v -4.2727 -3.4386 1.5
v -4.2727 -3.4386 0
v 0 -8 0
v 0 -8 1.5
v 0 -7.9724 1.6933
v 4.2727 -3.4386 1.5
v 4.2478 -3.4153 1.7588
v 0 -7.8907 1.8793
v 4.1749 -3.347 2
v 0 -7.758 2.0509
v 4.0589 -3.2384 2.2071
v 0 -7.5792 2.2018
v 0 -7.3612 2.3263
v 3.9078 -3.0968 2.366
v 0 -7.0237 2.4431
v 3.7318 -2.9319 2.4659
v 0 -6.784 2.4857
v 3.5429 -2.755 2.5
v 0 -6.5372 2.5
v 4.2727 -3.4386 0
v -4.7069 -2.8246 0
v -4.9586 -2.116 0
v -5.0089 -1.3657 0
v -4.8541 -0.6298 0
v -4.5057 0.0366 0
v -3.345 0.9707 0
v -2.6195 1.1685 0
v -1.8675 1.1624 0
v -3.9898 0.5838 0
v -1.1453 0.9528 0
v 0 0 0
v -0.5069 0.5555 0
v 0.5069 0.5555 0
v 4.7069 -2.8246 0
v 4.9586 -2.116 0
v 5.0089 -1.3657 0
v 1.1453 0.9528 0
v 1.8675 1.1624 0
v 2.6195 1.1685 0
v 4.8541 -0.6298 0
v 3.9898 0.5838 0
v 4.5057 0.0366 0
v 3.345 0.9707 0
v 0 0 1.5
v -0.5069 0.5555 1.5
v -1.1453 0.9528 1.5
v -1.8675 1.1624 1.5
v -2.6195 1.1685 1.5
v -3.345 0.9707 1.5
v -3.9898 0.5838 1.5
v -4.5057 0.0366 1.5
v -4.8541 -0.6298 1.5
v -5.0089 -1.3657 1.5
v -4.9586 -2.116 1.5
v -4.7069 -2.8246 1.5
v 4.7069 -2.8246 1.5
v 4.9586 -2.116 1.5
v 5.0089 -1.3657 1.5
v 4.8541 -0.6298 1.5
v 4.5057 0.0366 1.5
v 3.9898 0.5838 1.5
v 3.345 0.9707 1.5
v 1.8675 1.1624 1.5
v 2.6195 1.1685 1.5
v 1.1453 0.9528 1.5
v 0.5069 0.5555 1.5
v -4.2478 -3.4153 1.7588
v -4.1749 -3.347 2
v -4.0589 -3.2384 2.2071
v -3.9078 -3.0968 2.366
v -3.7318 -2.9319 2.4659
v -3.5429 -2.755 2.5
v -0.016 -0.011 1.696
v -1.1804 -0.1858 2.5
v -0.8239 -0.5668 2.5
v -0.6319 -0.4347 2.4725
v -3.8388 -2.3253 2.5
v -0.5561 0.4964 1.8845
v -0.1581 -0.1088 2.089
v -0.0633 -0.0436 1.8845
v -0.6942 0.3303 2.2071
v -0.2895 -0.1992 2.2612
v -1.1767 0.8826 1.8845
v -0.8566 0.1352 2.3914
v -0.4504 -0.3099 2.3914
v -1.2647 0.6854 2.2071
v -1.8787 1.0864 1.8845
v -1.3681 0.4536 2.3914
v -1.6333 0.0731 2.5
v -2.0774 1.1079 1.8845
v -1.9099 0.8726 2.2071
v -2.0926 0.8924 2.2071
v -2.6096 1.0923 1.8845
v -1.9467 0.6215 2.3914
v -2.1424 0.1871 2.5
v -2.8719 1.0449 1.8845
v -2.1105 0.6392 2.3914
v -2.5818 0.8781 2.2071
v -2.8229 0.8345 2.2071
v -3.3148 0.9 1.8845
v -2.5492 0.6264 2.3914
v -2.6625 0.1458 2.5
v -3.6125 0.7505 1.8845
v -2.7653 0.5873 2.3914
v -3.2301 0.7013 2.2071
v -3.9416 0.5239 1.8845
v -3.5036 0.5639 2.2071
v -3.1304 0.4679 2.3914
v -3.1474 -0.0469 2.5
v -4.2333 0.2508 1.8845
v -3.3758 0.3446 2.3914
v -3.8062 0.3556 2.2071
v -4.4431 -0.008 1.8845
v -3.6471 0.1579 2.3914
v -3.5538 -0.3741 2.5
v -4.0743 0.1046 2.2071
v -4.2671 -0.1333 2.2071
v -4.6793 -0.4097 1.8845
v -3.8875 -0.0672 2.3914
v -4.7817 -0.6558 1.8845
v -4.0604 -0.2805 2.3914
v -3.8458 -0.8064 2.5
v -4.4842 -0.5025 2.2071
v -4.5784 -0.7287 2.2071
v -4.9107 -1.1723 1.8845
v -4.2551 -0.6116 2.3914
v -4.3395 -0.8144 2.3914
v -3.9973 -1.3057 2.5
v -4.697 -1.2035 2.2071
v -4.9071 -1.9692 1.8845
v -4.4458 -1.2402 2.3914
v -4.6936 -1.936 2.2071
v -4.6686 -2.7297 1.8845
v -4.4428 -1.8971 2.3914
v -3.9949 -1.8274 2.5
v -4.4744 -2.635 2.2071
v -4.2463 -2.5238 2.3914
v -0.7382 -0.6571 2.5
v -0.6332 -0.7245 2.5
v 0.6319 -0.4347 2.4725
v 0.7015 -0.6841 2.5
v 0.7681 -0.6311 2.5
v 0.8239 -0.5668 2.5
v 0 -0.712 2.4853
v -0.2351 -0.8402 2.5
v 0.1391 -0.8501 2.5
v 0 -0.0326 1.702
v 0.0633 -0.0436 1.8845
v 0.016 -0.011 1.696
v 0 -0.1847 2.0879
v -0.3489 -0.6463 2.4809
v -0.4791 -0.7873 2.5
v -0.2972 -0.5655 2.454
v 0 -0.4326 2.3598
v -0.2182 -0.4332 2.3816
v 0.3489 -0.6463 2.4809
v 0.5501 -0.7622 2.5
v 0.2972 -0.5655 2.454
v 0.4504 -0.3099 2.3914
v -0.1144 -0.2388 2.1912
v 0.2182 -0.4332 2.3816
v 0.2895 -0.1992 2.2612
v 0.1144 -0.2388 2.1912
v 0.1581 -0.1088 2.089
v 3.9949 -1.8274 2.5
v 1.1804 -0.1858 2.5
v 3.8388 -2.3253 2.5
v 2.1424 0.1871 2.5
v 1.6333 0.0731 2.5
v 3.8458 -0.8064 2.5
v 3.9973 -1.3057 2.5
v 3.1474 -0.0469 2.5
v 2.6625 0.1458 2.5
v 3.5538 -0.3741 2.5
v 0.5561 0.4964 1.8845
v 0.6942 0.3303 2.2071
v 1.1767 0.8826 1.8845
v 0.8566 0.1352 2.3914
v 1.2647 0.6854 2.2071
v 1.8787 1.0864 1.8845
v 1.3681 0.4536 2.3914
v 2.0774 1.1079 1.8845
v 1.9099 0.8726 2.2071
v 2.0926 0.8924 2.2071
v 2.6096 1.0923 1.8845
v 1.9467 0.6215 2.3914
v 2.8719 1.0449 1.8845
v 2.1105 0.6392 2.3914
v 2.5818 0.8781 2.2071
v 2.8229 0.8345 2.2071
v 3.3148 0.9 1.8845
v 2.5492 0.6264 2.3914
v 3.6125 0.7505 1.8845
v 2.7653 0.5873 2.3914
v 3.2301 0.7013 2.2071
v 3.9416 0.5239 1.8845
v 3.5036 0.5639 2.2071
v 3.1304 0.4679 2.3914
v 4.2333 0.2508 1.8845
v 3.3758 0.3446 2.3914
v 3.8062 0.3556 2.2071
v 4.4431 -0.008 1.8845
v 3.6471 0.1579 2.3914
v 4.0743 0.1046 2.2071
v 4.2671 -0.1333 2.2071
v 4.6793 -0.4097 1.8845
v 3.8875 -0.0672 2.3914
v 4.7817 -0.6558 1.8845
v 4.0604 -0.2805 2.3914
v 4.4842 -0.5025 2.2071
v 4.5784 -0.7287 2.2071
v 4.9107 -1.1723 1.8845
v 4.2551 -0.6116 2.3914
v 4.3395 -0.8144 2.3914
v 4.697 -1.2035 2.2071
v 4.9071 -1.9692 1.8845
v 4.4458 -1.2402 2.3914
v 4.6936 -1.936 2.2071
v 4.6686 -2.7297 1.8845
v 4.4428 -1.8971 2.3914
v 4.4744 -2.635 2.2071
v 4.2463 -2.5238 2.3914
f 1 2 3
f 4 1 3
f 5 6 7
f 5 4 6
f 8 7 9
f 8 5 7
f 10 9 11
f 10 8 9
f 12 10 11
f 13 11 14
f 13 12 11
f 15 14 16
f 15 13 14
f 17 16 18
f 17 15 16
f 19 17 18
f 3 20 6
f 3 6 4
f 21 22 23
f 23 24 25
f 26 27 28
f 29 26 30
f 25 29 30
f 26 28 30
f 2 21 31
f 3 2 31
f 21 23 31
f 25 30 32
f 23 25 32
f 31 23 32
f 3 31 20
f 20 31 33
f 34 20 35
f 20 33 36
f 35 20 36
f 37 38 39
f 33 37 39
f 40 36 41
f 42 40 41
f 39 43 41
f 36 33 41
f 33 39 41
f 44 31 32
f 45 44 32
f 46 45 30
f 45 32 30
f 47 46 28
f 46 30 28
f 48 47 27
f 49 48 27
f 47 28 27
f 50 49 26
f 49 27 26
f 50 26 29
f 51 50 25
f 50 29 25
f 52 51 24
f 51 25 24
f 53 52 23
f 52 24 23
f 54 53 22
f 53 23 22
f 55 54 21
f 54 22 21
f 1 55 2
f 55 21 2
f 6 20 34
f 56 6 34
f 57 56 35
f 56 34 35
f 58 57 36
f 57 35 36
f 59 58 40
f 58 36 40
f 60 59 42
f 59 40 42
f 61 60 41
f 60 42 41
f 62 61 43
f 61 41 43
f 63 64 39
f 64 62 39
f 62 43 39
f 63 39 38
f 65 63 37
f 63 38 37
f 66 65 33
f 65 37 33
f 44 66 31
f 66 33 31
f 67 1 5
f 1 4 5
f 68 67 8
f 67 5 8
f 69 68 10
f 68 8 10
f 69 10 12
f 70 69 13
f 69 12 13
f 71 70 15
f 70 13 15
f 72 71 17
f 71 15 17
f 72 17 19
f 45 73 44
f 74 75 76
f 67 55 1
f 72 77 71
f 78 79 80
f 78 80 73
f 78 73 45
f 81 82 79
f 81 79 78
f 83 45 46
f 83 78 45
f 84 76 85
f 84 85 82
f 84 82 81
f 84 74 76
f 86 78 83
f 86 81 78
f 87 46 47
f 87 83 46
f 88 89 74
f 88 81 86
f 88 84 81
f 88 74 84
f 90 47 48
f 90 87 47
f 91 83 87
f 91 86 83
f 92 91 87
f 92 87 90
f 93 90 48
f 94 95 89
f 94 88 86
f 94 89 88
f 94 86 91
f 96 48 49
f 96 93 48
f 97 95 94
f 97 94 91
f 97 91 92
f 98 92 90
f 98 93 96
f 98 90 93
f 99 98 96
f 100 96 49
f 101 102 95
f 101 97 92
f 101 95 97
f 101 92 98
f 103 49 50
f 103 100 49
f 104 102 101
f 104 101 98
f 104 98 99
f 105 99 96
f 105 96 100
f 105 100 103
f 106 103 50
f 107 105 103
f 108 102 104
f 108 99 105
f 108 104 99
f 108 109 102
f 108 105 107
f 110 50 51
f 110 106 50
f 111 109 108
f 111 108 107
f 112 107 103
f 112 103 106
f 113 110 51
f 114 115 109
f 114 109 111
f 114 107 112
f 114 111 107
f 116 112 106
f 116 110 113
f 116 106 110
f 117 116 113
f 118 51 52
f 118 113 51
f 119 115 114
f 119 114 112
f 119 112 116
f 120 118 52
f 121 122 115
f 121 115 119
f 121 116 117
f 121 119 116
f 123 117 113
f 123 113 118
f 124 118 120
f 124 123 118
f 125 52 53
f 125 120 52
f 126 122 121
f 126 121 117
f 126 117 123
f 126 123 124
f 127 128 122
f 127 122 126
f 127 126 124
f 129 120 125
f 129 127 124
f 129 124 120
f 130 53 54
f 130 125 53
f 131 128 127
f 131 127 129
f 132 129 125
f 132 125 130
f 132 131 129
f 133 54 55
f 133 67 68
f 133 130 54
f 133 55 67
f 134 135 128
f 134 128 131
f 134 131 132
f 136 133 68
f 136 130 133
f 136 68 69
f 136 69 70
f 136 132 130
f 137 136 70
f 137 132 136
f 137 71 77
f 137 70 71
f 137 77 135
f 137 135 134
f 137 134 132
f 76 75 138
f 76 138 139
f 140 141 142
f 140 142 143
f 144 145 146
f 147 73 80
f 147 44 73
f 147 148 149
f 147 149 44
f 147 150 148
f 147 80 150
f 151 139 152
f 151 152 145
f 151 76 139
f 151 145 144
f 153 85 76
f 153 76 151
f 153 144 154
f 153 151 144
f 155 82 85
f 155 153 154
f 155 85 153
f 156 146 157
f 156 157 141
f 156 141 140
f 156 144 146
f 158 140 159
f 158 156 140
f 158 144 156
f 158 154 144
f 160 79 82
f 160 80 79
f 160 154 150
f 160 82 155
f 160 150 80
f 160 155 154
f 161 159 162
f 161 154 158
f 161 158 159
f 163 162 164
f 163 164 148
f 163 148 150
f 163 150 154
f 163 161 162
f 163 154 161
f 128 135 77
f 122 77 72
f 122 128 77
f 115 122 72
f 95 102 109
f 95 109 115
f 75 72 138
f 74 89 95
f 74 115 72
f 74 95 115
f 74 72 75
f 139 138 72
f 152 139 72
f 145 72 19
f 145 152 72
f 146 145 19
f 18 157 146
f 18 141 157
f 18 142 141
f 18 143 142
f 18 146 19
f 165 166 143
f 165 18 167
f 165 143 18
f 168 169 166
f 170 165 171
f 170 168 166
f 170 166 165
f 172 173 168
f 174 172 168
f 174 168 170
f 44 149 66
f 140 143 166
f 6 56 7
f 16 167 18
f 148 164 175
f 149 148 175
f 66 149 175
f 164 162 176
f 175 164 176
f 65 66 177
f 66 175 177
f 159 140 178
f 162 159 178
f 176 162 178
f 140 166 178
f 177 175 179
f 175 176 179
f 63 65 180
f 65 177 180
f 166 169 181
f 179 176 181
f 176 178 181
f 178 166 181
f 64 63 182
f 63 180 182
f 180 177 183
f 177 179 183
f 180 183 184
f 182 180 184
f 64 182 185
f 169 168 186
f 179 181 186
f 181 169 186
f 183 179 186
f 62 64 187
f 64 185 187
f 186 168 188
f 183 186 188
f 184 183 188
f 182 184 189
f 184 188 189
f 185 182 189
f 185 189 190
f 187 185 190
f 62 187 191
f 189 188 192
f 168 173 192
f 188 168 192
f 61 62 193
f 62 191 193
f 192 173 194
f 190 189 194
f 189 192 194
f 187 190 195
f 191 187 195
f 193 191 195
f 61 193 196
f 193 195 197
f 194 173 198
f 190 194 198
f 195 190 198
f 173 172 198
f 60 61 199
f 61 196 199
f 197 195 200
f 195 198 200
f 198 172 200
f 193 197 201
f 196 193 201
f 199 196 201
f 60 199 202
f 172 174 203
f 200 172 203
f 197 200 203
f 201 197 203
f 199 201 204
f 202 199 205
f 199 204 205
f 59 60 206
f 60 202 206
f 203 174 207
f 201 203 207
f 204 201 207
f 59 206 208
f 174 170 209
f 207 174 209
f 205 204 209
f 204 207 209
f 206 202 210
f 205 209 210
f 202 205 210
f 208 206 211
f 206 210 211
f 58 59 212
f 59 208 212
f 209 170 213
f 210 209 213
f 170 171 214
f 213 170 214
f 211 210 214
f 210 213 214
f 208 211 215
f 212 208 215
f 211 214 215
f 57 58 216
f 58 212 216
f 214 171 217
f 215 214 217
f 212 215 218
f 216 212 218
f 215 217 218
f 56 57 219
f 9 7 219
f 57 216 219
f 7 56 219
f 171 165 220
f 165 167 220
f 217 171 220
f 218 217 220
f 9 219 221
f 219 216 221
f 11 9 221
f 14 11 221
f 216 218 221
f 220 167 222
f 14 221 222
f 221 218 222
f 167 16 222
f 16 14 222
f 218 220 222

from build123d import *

# Parameters (mm, degrees)
PAD_DEPTH = 2.5
FILLET_R  = 1


with BuildPart() as part:
    # Sketch → Pad (new body)
    with BuildSketch(Plane.XY):
        with BuildLine():
            ThreePointArc((0, 0), (-3.989817, 0.583782), (-4.272701, -3.438583))
            Line((-4.272701, -3.438583), (0, -8))
            Line((4.272701, -3.438583), (0, -8))
            ThreePointArc((4.272701, -3.438583), (3.989817, 0.583782), (0, 0))
        make_face()
    extrude(amount=PAD_DEPTH)

    # Fillet
    fillet_edges = [part.edges().sort_by_distance(p)[0] for p in [
        (-3.989817, 0.583782, 2.5),
        (-2.13635, -5.719291, 2.5),
        (2.13635, -5.719291, 2.5),
        (3.989817, 0.583782, 2.5),
    ]]
    fillet(fillet_edges, radius=FILLET_R)


solid = part.part
